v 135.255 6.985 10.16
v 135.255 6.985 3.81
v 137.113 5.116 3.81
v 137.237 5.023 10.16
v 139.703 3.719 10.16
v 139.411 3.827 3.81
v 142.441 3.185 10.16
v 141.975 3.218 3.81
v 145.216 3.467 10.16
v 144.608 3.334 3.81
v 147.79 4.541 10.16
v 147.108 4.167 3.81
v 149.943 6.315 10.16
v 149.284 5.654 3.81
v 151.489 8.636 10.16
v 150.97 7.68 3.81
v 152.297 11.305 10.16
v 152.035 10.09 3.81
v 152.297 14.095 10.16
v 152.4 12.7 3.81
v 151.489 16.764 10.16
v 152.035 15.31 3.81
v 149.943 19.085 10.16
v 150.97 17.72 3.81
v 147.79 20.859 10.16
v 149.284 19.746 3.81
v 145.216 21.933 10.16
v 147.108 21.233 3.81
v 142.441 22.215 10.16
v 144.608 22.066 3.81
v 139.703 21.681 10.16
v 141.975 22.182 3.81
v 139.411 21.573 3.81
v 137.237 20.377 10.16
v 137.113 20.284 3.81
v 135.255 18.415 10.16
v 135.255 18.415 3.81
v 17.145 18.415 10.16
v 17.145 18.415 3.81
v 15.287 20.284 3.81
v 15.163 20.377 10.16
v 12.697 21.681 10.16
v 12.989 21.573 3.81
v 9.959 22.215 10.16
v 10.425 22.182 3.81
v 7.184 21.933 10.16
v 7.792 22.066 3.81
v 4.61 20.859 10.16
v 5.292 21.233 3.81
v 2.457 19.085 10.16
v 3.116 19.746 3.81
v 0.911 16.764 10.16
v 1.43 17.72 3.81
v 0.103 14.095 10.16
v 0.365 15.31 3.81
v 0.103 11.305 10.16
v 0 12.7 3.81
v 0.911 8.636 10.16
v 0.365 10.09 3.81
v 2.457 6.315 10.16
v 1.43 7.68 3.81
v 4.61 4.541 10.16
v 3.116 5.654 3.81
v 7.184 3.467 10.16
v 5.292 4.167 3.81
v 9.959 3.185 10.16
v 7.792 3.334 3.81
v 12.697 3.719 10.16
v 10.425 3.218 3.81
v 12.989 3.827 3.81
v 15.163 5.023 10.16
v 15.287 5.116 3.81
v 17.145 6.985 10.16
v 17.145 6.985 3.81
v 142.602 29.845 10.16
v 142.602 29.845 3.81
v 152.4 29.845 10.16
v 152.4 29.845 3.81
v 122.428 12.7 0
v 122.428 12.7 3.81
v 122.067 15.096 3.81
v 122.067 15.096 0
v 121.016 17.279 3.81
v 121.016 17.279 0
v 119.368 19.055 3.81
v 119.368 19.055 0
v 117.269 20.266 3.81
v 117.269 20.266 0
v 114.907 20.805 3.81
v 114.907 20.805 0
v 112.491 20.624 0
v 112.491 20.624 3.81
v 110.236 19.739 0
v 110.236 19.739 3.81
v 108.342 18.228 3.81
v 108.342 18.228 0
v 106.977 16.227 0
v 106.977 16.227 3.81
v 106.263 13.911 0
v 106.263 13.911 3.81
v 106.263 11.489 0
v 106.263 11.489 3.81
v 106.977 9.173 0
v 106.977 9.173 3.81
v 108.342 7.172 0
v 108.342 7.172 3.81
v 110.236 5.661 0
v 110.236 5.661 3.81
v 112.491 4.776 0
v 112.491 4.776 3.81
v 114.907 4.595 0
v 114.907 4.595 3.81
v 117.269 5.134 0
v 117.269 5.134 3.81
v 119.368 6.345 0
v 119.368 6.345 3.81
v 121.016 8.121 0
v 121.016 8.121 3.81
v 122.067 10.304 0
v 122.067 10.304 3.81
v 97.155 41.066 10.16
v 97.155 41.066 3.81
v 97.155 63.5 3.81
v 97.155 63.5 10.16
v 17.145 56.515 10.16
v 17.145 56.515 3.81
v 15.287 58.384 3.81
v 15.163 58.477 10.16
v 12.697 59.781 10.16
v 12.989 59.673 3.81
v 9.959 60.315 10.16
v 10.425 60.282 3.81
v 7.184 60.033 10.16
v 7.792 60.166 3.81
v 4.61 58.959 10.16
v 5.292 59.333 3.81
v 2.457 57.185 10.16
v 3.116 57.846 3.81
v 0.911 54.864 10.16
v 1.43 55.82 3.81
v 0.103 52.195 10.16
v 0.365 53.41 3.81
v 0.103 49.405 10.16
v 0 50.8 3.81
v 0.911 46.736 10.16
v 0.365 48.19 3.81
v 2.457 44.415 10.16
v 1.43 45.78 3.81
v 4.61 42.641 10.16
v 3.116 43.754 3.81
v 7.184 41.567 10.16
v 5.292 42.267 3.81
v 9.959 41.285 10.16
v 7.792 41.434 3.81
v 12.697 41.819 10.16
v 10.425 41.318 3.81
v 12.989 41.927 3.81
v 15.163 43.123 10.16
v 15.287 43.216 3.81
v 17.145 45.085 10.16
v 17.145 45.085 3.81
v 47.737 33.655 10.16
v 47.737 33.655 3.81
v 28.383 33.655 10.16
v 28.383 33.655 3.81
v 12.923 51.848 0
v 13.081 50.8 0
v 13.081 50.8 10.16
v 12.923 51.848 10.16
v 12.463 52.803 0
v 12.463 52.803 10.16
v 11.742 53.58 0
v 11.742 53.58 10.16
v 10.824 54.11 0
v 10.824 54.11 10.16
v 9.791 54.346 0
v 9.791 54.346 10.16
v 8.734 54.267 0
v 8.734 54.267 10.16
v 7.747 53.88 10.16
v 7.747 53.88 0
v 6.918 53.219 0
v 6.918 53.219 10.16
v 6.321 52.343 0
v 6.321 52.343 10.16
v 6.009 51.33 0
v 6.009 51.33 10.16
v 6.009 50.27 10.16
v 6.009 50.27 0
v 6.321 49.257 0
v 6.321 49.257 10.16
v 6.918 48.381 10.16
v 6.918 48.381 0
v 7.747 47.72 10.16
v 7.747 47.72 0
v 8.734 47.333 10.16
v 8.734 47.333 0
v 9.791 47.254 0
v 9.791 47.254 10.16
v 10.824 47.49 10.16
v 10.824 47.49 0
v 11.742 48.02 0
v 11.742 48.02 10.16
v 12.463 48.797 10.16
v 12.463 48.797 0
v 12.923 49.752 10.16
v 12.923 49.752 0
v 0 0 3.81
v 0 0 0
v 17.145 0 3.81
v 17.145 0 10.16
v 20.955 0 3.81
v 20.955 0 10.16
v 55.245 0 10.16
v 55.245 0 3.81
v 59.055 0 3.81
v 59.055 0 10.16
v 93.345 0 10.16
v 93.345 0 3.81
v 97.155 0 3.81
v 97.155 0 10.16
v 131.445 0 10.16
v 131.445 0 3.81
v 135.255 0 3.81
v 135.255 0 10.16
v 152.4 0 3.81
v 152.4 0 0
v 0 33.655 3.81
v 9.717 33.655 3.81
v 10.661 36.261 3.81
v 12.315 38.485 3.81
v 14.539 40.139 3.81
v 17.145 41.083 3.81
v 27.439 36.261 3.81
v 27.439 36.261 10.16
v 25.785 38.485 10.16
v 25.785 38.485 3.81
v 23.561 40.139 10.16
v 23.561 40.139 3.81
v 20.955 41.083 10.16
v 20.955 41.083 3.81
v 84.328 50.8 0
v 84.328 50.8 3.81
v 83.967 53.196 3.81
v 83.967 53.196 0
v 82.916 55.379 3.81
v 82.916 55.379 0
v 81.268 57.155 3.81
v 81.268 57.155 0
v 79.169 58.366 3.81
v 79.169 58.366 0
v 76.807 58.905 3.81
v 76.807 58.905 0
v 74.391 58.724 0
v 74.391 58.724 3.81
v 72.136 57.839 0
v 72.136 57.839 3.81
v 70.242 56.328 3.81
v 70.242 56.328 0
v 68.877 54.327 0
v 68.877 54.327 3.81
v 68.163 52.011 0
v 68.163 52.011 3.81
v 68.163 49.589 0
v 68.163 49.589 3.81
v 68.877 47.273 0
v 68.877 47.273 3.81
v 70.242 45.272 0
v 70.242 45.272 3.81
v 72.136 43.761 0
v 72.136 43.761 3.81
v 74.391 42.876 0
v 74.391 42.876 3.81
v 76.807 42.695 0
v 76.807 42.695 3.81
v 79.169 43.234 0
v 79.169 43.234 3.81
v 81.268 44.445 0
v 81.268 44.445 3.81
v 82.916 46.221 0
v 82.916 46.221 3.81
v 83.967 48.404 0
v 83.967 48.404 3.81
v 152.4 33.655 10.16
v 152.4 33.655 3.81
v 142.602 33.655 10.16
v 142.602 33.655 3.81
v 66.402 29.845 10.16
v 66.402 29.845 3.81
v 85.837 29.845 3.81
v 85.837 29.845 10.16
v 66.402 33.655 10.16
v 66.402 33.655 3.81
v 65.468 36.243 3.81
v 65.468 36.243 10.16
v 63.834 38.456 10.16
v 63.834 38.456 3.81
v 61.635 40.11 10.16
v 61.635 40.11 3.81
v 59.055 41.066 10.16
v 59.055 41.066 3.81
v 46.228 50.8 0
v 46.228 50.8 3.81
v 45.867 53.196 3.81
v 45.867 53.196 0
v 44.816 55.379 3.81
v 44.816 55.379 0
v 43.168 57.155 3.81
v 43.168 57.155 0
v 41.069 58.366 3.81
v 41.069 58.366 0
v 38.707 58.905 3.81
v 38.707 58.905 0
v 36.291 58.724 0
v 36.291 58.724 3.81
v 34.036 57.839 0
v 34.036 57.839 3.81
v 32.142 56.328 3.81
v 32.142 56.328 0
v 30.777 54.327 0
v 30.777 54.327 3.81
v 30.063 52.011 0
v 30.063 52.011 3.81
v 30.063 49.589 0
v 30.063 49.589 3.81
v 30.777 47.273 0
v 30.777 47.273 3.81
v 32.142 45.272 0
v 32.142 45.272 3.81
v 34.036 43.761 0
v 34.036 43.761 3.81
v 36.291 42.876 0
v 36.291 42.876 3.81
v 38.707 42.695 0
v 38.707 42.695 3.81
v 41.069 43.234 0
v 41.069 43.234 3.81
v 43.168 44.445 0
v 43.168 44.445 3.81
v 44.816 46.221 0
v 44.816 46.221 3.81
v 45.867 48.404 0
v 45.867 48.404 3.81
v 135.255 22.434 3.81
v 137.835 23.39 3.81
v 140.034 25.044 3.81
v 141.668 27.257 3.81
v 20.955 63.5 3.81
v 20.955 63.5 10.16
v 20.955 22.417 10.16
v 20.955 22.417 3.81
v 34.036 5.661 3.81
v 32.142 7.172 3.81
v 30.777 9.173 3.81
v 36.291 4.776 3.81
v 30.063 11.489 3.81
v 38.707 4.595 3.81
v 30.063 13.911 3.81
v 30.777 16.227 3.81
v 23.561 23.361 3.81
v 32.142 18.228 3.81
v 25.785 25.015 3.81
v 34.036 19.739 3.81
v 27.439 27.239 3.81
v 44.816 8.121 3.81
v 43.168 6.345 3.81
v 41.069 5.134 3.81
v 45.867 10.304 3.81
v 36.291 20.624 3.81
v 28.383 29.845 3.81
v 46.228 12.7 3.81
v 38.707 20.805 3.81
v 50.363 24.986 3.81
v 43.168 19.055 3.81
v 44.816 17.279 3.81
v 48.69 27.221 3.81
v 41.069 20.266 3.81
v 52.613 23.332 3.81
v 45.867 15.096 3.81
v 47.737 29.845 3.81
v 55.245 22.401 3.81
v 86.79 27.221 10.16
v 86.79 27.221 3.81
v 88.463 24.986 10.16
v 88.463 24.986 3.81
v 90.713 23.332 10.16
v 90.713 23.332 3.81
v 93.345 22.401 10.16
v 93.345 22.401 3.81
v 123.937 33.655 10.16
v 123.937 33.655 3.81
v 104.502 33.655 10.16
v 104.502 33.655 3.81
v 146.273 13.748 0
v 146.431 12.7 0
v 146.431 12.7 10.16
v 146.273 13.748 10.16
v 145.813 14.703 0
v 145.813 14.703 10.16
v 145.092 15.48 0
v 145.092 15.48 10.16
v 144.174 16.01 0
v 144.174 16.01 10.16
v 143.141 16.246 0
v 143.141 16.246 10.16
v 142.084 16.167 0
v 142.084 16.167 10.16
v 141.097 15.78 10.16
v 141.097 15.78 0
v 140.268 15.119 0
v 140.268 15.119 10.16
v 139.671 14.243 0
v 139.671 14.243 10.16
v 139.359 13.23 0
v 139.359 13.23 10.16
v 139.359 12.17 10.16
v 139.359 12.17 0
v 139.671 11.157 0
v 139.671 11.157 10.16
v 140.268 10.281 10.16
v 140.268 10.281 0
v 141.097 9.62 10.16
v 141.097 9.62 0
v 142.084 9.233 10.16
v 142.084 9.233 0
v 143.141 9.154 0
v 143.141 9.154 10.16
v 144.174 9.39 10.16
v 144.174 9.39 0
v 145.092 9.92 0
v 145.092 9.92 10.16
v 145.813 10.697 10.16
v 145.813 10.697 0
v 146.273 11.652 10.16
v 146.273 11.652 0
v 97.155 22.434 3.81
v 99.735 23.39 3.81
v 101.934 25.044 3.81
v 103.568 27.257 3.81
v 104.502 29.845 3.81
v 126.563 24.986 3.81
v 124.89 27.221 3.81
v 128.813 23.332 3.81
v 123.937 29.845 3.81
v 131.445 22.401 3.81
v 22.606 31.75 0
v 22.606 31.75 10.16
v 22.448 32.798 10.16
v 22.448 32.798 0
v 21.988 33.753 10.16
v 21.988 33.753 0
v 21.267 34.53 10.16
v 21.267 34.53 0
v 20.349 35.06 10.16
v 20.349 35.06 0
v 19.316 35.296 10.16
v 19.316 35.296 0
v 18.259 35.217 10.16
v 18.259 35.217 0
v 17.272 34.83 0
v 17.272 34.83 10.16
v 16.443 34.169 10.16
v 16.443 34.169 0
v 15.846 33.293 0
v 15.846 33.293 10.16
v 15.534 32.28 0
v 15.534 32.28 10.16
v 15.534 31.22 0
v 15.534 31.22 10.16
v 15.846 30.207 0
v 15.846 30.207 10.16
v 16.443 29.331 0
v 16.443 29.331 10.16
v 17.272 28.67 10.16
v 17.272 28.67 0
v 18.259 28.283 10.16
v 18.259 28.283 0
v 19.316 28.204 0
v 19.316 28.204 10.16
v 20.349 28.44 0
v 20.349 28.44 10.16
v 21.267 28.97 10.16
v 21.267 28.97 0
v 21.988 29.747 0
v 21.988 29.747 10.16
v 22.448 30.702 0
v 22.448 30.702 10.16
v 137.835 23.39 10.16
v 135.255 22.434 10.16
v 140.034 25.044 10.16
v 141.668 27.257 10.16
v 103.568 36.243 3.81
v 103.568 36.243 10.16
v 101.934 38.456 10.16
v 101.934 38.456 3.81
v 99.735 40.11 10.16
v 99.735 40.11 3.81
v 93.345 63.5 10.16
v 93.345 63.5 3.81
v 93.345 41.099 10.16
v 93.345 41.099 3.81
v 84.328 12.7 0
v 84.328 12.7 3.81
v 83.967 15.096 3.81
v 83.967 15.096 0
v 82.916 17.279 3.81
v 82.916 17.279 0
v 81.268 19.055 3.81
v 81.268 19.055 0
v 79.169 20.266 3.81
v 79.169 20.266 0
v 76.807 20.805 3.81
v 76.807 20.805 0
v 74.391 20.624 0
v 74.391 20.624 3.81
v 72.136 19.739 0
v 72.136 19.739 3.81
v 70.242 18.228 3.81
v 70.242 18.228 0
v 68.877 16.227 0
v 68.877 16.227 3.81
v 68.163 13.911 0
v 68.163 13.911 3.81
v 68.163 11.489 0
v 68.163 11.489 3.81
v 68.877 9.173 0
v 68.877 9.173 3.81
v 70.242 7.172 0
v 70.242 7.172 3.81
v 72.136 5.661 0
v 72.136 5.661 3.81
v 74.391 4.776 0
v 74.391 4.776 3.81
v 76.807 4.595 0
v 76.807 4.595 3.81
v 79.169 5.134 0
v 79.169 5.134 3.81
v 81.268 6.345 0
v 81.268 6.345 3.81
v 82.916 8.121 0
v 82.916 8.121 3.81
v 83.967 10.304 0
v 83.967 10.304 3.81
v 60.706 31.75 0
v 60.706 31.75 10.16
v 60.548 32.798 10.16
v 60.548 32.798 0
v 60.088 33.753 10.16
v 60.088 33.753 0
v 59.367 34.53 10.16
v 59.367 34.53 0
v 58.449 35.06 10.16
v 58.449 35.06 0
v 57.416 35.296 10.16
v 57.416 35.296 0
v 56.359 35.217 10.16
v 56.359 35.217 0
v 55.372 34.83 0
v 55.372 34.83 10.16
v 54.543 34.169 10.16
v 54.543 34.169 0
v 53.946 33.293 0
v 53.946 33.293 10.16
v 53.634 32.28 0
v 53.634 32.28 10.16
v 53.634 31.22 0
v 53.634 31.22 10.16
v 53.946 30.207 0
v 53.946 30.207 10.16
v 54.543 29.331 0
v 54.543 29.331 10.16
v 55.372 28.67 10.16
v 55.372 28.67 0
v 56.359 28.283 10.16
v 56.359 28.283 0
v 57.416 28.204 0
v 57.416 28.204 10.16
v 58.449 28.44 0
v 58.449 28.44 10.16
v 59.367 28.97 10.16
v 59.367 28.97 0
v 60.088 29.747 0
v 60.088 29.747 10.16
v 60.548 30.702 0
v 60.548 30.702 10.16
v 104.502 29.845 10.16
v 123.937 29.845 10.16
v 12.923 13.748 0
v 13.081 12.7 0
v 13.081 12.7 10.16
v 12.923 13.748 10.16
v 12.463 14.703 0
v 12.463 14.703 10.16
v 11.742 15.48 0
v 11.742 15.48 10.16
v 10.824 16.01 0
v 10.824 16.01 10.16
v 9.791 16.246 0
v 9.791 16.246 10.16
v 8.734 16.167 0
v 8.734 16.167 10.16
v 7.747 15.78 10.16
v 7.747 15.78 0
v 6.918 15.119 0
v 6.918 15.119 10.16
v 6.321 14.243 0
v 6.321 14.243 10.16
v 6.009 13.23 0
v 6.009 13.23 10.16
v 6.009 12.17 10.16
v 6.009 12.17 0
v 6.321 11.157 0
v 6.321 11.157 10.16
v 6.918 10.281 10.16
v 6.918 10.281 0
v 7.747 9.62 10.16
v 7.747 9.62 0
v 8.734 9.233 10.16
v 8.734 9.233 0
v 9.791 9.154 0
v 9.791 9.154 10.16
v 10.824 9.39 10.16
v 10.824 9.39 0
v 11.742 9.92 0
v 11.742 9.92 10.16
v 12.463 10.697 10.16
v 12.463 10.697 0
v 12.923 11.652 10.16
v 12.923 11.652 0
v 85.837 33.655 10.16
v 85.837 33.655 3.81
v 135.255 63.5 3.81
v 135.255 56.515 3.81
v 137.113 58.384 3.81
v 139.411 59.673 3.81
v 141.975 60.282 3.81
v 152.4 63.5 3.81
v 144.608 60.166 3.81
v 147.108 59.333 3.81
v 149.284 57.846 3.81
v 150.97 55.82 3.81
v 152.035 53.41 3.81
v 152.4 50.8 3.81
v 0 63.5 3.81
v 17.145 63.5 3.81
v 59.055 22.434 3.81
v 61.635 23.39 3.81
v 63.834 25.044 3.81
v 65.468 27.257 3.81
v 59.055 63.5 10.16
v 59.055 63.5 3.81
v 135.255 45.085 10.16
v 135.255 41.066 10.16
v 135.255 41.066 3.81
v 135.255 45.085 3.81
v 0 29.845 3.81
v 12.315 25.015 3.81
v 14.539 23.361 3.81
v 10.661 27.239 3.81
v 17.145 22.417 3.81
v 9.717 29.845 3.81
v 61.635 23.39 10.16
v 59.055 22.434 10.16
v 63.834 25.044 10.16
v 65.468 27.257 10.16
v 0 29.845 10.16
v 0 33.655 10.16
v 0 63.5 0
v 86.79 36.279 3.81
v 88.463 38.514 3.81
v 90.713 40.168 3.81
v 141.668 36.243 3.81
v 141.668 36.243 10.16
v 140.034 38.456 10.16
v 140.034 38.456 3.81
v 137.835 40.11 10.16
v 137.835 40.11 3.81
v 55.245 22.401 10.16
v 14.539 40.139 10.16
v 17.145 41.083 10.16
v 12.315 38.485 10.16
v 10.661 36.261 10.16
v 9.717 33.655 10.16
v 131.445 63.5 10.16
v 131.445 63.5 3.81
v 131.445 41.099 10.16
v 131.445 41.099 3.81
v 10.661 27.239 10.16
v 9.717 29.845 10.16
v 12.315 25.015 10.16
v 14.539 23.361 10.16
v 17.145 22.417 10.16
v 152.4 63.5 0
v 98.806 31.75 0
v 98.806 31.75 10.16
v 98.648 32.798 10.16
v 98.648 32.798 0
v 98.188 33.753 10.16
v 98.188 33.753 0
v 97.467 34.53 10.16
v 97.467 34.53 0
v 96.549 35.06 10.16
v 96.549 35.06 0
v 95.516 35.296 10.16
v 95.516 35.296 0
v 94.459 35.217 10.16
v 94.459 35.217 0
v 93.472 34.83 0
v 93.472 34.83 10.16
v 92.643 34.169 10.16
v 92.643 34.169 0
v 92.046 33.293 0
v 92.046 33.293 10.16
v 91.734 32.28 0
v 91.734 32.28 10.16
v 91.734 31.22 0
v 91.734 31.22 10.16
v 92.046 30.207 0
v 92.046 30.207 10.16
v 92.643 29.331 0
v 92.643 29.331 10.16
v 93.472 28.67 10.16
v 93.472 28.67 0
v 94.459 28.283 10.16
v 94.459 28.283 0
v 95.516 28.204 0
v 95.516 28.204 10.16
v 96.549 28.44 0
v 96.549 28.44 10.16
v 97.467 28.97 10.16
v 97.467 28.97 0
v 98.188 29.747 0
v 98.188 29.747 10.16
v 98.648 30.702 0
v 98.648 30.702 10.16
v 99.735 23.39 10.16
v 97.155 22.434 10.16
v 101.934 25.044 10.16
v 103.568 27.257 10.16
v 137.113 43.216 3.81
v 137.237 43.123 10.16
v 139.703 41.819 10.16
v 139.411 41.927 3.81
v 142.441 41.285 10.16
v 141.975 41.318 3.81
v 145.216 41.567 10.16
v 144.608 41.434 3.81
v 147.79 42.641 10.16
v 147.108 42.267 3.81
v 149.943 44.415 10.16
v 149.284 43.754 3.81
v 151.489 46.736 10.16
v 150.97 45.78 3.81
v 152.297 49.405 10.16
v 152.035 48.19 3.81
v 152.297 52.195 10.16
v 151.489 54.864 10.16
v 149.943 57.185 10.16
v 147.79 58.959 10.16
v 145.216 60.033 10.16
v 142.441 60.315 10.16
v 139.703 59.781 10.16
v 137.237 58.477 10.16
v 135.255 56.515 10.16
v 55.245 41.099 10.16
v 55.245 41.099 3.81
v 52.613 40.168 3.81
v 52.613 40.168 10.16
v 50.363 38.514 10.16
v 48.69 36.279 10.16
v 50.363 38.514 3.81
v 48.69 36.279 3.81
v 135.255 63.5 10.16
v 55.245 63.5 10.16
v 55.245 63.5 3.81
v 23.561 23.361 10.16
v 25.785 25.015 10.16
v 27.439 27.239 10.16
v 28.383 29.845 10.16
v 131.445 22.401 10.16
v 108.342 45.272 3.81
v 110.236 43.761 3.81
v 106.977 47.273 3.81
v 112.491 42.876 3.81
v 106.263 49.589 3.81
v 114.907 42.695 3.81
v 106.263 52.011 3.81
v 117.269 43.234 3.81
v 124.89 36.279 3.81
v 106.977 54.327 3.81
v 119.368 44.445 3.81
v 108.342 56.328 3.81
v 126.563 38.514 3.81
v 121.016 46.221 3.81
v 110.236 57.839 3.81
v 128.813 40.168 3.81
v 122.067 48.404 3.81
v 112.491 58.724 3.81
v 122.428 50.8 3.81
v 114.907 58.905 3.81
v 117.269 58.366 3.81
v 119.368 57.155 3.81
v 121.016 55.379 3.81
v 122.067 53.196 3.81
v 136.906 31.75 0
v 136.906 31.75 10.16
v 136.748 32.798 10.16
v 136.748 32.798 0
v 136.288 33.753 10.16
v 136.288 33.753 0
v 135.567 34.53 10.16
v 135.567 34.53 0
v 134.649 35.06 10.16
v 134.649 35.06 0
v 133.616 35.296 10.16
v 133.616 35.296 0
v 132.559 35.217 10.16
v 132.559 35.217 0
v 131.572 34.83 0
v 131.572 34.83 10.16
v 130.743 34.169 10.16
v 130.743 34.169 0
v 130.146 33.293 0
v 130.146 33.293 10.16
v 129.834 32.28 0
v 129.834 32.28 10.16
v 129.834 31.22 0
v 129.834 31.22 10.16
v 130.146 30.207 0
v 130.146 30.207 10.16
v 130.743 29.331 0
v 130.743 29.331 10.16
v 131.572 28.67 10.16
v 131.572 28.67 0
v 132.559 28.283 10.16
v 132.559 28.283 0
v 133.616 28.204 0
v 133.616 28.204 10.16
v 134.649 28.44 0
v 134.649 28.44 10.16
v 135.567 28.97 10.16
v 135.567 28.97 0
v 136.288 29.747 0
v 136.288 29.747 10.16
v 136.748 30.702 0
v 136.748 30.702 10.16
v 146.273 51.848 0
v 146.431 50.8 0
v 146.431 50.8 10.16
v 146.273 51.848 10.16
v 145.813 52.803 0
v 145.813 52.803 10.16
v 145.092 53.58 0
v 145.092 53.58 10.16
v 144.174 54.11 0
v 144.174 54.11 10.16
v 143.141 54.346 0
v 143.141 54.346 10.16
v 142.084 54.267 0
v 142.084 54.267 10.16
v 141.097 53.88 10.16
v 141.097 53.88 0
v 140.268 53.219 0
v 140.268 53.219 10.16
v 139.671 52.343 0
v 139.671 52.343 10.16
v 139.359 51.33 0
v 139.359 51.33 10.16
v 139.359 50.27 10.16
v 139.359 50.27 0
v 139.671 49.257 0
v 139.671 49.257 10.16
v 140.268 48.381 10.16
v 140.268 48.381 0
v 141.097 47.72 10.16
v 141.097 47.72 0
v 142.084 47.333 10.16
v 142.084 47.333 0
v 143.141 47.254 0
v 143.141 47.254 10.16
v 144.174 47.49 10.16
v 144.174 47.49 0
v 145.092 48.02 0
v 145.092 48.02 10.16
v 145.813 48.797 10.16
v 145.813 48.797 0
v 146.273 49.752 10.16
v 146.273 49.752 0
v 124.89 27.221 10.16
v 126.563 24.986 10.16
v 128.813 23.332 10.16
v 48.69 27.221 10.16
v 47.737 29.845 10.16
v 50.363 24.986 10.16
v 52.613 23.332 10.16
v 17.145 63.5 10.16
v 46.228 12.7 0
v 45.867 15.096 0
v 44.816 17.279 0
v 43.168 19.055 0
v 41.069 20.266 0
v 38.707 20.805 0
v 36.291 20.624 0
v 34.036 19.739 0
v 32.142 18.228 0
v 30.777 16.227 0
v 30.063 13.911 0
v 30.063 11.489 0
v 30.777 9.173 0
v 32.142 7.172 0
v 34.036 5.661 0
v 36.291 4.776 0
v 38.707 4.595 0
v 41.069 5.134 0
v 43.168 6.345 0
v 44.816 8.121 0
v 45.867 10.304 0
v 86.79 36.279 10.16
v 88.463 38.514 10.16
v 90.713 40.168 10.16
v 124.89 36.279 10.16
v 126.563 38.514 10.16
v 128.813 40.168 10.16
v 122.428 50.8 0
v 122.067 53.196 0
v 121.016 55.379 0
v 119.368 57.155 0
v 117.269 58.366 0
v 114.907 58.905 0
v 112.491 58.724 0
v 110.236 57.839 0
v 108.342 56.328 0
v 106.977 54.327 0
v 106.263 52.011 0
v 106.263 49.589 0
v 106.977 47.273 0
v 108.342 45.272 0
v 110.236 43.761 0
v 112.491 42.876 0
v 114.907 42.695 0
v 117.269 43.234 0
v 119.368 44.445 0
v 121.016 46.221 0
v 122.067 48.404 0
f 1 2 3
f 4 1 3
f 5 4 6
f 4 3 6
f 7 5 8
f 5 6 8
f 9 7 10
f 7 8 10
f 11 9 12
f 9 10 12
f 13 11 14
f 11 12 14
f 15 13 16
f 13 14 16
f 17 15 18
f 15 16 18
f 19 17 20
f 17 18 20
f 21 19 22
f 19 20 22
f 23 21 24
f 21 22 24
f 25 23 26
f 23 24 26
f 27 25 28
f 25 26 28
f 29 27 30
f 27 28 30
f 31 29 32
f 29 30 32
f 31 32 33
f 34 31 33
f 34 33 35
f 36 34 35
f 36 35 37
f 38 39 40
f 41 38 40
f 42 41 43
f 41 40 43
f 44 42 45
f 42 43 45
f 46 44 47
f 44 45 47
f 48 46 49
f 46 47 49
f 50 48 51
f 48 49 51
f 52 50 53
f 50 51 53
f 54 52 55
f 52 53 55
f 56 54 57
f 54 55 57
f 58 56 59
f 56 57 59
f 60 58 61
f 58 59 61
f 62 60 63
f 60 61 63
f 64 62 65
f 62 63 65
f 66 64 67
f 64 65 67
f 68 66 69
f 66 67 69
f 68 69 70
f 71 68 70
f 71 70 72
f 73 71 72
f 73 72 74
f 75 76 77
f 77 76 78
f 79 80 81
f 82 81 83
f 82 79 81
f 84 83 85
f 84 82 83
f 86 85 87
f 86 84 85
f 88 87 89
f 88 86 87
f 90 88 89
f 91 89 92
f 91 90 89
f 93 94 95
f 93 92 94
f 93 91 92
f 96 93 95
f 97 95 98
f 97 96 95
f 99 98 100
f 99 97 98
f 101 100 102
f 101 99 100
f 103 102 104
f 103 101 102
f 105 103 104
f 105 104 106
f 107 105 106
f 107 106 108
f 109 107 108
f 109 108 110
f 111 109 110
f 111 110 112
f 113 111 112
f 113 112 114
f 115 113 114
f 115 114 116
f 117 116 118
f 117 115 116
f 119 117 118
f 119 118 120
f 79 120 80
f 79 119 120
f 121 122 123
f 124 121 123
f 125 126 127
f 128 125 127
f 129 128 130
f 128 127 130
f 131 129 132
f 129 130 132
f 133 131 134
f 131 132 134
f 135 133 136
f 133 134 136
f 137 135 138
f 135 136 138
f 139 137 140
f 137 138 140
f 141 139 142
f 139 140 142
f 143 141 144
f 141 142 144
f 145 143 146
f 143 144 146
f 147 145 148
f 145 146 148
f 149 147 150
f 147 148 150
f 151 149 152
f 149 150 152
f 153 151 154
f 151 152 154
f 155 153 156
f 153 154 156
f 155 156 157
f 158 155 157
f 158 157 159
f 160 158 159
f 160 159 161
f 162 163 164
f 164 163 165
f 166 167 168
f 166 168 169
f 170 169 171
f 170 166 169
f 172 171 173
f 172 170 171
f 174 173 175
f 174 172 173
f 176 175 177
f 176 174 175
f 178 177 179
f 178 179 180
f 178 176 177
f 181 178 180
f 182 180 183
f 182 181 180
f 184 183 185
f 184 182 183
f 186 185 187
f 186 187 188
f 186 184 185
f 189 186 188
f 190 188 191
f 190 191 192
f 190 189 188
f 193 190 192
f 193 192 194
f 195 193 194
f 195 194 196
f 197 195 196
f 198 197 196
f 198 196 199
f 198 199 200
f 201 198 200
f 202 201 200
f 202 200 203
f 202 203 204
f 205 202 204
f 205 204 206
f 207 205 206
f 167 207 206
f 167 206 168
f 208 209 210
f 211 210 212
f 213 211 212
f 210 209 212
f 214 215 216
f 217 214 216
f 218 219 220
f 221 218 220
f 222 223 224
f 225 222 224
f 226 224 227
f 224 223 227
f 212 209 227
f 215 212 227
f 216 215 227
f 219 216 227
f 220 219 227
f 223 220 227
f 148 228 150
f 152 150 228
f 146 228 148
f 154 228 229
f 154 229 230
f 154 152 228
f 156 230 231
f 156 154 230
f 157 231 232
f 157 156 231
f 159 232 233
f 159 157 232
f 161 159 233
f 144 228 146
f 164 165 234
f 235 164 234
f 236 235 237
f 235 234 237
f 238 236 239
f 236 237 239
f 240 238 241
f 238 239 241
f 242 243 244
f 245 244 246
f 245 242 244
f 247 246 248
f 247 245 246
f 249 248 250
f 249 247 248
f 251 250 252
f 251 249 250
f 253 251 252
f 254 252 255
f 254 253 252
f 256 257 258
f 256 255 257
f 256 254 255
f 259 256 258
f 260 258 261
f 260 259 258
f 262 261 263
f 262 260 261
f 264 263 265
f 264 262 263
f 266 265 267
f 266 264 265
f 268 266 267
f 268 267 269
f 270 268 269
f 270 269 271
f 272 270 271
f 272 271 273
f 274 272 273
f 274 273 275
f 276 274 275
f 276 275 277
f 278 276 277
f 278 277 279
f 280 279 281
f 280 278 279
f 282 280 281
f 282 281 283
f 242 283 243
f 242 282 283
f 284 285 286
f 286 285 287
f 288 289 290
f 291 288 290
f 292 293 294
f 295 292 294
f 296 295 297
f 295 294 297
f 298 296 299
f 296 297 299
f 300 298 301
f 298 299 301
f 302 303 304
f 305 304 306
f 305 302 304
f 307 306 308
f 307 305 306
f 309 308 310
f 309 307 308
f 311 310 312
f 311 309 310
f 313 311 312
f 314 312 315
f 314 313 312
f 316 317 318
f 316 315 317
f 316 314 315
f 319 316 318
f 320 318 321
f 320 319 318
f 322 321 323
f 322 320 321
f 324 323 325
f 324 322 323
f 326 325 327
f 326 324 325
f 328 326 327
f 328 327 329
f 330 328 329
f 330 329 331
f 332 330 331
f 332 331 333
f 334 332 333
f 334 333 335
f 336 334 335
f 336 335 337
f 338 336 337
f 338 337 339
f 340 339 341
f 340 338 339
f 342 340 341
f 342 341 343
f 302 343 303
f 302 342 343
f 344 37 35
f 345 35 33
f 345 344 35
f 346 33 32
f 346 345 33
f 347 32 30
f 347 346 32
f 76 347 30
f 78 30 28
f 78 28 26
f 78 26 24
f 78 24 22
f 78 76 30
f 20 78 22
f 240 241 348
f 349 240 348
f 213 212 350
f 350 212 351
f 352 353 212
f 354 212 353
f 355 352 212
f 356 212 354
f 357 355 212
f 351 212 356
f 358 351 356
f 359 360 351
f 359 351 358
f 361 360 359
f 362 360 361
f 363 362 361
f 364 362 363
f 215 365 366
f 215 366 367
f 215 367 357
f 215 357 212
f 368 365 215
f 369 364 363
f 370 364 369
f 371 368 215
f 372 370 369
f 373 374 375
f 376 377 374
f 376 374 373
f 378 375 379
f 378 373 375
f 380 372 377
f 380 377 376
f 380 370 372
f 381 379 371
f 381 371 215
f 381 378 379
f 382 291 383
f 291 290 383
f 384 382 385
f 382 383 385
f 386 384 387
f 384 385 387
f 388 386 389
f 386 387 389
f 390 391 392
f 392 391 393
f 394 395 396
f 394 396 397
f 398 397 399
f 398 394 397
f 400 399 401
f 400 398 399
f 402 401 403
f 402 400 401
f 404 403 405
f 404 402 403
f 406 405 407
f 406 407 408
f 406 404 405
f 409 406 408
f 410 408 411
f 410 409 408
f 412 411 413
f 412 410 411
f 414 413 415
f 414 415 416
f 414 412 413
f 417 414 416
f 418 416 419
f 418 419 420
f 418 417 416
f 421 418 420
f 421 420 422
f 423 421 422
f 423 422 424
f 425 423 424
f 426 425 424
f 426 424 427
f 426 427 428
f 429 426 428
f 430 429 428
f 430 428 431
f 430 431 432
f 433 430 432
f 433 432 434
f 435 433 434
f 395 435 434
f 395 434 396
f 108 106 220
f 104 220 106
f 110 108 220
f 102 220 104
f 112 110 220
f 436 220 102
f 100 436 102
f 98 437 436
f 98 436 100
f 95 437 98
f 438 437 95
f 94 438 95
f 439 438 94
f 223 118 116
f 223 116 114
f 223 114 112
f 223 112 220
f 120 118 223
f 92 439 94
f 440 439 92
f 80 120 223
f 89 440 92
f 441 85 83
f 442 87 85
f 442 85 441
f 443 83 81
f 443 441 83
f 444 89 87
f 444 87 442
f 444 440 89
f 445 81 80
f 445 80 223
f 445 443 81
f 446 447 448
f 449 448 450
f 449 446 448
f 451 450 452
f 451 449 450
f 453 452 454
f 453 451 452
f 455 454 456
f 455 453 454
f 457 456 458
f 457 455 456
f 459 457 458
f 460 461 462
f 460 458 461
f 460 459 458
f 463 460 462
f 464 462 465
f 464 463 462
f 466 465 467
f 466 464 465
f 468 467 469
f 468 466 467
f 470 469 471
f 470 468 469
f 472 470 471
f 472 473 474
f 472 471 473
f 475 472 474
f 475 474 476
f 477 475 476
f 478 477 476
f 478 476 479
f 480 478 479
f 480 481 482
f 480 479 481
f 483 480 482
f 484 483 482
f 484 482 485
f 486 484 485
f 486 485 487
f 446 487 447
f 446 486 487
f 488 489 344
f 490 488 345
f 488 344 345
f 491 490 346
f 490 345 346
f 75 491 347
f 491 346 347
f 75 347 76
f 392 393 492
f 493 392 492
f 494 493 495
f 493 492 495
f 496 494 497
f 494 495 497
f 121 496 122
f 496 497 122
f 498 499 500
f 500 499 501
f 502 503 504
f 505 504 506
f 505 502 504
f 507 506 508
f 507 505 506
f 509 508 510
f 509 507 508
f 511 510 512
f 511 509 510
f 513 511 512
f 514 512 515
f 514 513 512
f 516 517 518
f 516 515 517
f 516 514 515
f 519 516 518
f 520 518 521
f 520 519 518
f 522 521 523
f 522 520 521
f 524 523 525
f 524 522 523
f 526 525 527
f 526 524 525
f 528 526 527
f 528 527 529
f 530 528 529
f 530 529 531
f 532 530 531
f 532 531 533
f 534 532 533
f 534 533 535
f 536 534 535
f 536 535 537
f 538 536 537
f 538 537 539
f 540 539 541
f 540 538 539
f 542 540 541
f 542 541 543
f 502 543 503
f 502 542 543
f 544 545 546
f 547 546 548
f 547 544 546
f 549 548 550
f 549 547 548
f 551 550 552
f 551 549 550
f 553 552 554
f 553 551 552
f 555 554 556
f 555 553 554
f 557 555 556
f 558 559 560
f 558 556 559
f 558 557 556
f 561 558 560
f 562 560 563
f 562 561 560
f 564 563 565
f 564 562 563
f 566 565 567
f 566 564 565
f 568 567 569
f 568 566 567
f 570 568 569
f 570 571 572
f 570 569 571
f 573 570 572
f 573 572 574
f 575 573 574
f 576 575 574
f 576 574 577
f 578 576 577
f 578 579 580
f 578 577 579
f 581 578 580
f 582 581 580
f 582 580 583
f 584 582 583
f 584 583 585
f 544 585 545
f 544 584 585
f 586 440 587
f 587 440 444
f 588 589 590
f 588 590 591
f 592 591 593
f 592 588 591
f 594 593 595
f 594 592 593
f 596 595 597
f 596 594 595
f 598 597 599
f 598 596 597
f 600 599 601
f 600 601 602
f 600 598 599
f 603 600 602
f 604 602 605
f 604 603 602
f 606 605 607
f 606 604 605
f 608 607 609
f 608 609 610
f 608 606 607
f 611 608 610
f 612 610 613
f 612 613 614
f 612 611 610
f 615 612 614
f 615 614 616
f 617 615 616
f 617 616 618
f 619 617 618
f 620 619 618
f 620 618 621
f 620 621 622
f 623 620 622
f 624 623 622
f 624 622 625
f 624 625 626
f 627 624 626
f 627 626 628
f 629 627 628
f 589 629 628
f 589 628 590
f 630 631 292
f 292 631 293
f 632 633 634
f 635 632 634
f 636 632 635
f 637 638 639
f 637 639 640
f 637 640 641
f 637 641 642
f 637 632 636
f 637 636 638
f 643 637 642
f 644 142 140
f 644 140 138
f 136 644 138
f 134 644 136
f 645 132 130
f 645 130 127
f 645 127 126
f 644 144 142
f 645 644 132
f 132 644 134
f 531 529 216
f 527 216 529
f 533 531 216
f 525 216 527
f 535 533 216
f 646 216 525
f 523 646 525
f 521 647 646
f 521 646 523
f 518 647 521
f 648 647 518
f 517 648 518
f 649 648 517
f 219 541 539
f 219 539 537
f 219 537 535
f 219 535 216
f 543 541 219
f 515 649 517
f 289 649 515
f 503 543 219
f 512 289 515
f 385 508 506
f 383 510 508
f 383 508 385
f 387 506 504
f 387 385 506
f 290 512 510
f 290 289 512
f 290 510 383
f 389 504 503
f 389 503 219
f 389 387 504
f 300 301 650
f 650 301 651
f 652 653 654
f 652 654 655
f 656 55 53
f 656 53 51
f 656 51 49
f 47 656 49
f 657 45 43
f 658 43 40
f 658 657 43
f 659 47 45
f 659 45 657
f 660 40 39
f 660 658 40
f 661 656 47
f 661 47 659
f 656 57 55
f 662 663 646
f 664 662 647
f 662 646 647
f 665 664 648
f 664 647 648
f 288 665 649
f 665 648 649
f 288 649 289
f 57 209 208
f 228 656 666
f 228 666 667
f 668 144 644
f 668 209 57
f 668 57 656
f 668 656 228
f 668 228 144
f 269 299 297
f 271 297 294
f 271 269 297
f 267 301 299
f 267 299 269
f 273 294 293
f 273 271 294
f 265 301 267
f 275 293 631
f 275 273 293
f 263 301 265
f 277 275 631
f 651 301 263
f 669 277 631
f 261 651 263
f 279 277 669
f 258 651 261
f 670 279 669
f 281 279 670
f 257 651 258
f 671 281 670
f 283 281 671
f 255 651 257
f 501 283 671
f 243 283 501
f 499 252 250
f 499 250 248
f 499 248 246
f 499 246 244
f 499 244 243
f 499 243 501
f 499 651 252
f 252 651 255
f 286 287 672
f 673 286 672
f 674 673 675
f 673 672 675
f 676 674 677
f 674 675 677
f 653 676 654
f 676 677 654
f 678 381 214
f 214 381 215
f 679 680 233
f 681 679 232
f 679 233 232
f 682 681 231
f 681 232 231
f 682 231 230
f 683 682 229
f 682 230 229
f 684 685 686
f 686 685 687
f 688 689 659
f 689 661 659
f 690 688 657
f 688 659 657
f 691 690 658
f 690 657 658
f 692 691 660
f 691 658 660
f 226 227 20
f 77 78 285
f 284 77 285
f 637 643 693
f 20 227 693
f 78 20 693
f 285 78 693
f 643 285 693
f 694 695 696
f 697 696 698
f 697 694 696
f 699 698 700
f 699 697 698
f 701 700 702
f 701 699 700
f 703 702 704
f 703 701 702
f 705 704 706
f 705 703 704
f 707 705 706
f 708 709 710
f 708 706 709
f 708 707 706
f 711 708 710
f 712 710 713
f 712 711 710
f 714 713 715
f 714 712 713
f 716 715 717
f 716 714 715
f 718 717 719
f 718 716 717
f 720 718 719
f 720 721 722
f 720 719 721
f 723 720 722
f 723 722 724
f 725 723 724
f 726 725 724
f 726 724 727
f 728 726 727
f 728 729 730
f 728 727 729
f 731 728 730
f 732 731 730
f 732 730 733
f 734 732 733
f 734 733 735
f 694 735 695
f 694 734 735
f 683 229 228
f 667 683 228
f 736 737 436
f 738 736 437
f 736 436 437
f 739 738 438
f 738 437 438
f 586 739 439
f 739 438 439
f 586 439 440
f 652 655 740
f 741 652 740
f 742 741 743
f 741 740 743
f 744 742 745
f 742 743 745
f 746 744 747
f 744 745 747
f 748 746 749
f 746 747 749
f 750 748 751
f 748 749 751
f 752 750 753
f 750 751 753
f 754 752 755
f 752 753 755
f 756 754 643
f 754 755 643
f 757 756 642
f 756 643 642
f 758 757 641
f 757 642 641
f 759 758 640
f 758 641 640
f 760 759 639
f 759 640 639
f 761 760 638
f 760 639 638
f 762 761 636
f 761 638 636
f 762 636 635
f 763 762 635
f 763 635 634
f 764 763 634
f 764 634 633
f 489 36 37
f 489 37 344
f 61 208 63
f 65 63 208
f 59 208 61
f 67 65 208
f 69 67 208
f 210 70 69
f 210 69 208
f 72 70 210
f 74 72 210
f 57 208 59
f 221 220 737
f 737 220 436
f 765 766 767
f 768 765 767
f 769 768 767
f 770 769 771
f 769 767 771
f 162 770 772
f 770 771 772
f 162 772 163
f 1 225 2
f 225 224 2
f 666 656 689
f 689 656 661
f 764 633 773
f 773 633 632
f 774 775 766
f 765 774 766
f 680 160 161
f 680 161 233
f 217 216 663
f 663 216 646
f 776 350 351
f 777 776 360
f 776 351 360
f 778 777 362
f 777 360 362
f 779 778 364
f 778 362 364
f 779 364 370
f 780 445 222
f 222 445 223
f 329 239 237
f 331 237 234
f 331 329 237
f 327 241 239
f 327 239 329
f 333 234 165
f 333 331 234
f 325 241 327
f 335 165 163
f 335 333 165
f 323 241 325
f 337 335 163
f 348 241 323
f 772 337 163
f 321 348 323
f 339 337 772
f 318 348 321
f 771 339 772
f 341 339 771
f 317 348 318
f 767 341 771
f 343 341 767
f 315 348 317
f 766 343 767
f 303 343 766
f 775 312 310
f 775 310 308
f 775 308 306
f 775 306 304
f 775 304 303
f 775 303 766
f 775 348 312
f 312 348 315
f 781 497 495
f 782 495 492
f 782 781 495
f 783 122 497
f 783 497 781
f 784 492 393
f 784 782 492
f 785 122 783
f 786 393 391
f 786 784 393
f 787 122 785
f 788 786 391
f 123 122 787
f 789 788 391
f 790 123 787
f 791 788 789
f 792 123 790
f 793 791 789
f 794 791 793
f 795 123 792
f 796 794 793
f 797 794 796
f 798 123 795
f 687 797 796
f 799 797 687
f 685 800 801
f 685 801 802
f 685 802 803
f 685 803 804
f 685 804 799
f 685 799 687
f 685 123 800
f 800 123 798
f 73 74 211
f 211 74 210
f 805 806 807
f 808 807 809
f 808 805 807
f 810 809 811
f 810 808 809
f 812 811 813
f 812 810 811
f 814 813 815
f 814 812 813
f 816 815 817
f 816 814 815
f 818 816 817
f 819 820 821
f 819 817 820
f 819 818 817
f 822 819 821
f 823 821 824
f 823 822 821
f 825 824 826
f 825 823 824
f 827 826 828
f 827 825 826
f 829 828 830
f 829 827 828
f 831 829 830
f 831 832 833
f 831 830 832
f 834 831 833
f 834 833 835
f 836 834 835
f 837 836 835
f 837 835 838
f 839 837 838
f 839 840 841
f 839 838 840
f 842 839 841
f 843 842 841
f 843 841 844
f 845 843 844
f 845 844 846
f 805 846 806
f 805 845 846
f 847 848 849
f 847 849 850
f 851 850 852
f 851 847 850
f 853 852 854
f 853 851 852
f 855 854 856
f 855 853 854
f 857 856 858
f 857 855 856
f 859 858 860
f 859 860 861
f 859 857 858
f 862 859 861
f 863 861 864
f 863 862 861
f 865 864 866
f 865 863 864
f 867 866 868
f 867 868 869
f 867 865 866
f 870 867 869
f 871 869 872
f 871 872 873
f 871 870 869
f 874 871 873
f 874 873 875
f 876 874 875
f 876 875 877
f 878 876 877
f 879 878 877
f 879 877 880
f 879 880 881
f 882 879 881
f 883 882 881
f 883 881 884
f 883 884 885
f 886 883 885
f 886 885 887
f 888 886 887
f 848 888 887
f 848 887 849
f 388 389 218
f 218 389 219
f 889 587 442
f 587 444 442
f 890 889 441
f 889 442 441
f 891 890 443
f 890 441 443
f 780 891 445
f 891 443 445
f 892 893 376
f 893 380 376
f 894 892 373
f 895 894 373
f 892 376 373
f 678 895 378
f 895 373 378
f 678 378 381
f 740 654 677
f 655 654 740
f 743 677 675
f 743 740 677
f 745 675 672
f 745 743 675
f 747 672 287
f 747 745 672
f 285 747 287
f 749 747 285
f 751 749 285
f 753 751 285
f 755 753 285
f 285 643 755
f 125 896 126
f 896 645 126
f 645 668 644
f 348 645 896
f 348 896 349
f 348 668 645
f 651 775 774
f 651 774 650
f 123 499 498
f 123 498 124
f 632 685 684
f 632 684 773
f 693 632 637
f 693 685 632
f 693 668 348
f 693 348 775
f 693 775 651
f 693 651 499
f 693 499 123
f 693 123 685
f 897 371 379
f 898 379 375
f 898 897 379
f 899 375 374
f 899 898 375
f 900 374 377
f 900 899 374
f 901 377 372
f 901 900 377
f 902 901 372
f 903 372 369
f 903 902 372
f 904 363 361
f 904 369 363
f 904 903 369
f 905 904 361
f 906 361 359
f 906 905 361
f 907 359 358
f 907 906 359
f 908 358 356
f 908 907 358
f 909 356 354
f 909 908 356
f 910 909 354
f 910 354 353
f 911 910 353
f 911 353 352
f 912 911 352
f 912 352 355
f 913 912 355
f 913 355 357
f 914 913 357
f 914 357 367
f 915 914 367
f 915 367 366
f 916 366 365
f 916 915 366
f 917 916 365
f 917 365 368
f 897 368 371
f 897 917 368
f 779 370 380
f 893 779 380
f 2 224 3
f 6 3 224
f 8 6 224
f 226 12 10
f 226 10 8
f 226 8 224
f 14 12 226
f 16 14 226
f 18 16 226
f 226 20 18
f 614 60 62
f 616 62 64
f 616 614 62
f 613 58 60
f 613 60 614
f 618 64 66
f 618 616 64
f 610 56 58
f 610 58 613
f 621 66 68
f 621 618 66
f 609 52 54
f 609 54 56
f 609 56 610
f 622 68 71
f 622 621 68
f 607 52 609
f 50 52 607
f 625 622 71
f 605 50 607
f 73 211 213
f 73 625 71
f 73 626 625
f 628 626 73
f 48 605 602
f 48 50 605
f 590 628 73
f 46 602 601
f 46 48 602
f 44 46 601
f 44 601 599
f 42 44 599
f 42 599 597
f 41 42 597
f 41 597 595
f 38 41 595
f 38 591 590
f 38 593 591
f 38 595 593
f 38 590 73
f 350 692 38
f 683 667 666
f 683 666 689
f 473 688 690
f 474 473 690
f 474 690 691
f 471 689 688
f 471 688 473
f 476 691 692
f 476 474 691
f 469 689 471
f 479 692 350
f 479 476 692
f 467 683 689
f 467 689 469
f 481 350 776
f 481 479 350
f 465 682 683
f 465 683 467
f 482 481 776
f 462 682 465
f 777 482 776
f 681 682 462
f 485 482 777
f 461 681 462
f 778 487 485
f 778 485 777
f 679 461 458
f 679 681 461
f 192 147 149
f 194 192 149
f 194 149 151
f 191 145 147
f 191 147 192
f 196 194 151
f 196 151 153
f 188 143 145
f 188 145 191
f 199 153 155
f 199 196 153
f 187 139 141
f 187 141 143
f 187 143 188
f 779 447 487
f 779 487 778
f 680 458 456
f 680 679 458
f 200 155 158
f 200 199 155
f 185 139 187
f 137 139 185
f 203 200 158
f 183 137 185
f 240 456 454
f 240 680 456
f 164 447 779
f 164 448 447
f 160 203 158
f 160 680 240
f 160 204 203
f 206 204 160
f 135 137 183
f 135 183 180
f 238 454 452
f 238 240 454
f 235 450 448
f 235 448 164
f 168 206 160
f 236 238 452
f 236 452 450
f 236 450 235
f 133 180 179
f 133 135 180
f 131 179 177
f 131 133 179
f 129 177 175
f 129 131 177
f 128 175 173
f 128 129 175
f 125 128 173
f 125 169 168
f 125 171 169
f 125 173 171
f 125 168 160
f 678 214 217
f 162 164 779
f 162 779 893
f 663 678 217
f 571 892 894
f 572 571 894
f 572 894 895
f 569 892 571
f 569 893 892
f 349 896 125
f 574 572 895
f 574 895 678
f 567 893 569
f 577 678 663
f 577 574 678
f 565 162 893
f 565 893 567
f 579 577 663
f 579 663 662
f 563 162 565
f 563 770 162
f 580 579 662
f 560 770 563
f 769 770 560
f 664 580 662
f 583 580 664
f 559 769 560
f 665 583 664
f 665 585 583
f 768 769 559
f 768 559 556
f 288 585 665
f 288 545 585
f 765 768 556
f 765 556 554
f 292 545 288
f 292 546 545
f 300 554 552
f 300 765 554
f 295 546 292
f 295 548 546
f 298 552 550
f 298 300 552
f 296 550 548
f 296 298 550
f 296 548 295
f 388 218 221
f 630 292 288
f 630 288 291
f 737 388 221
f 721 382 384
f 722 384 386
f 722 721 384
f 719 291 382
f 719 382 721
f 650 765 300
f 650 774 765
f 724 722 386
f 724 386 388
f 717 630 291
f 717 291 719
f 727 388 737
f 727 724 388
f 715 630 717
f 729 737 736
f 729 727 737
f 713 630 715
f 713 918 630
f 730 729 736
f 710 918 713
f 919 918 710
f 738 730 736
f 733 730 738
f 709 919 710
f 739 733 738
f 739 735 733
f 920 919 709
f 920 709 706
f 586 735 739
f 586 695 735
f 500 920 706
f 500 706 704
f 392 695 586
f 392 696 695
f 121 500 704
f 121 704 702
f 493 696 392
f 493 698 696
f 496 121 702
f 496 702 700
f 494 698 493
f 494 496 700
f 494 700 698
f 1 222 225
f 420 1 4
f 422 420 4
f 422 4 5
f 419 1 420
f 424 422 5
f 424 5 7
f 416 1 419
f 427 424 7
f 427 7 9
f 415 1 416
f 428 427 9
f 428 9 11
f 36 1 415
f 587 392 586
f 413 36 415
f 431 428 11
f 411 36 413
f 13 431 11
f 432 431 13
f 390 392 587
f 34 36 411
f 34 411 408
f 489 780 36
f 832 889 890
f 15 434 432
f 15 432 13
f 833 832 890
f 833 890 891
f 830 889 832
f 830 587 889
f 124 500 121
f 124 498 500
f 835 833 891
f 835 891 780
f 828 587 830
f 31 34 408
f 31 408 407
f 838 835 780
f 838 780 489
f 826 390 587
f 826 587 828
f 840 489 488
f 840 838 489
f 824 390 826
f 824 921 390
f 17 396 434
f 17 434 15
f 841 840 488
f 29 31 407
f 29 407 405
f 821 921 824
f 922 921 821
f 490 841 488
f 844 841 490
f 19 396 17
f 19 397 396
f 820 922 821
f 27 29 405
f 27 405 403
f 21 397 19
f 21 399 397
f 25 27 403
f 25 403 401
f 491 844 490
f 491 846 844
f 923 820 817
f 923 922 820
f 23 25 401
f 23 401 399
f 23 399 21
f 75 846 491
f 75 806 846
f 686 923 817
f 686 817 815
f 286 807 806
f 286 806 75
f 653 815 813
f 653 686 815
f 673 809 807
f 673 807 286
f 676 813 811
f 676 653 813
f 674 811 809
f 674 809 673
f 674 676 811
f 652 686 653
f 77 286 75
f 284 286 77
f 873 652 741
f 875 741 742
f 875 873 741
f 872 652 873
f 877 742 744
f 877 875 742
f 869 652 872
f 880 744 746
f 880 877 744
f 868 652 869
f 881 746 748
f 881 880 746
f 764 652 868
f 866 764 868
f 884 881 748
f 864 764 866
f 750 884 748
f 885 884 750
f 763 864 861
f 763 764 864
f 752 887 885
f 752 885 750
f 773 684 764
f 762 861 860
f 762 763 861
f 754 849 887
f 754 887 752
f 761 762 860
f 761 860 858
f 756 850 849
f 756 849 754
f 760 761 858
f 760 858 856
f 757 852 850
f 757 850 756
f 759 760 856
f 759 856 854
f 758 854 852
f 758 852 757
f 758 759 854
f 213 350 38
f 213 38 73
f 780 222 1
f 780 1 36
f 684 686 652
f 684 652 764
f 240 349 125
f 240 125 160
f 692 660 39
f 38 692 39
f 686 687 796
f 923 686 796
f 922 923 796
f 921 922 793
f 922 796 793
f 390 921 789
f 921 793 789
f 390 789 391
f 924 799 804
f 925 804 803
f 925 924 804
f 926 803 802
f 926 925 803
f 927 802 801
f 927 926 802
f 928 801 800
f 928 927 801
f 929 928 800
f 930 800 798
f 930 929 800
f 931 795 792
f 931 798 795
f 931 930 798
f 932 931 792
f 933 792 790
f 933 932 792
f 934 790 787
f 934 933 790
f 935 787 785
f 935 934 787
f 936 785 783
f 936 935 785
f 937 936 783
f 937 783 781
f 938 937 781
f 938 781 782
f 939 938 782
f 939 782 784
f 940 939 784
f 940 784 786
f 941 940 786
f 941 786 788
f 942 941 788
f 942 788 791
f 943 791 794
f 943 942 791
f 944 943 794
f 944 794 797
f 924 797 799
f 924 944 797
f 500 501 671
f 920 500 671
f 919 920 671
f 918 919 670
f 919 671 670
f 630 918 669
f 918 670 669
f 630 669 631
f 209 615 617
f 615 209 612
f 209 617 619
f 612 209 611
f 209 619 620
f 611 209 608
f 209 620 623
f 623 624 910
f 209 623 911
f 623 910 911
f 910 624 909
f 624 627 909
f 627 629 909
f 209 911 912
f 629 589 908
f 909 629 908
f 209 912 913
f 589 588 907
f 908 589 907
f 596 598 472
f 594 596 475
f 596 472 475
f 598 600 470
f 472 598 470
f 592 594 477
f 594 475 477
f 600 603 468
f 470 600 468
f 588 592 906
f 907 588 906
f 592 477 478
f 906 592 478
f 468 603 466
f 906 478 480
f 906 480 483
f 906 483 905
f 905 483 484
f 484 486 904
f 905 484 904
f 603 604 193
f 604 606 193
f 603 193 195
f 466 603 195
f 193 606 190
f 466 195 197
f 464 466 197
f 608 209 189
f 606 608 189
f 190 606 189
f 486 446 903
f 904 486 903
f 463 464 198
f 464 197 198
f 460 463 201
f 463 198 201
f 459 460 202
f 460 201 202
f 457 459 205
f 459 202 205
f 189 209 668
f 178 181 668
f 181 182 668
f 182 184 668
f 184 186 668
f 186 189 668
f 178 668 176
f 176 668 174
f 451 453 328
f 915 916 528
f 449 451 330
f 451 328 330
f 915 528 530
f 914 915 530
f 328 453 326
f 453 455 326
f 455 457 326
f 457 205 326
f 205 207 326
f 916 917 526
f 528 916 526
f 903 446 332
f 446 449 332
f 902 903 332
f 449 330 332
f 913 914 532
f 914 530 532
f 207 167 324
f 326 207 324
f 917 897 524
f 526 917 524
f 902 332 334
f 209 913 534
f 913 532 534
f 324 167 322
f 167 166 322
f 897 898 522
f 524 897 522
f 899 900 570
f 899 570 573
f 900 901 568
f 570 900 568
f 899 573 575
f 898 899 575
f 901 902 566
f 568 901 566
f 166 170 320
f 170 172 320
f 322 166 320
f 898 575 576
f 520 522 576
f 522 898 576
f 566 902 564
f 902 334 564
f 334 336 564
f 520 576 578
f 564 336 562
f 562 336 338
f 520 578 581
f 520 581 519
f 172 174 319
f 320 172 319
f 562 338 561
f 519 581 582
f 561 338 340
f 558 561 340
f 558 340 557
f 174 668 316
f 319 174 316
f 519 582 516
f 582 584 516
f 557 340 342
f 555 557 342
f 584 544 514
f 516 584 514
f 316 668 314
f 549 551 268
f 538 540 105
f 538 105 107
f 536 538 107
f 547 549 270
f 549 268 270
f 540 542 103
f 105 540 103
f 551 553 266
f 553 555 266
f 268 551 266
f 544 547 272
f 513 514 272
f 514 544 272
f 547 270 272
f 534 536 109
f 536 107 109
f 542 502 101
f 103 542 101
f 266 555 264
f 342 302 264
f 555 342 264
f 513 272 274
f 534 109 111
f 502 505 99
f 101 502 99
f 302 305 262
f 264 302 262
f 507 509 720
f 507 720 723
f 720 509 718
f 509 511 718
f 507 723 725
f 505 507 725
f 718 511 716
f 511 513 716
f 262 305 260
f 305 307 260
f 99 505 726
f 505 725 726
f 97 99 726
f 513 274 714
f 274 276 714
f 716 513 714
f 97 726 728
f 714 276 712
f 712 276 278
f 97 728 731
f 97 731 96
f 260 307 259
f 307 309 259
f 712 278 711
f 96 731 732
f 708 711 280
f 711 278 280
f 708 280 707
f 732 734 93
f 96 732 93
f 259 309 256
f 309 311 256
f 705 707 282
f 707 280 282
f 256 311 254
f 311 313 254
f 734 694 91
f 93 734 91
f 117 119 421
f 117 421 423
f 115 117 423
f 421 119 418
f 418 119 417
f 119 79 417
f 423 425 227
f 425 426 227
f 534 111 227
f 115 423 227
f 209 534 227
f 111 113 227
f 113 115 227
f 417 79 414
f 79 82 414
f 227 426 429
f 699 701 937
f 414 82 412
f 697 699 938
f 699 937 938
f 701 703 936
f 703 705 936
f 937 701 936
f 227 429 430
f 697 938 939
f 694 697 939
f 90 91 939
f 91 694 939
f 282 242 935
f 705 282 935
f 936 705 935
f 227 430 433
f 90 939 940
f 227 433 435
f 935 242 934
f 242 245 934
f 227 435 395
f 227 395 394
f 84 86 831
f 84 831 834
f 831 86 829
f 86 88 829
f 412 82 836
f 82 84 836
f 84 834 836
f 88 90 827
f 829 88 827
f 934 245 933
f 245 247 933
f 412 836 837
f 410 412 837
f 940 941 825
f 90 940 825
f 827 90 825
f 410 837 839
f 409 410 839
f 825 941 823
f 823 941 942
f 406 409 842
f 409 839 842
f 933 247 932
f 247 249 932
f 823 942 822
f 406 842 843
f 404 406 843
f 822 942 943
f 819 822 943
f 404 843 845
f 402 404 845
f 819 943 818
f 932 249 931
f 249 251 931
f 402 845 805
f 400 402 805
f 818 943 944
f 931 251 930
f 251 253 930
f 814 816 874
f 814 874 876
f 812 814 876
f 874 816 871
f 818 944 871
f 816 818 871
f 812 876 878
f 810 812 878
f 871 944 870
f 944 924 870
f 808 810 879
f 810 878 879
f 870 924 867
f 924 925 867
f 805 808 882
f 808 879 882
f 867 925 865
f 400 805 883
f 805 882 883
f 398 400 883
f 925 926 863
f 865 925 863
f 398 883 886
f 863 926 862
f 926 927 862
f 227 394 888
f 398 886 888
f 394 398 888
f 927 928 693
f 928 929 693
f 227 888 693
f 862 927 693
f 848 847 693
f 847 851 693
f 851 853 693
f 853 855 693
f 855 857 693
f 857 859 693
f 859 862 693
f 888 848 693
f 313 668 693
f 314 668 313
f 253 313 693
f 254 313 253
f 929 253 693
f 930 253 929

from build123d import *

# Parameters (mm, degrees)
F0_W      = 152.4
F0_H      = 63.5
F1_DEPTH  = 3.81
F2_R      = 8.128
F3_DEPTH  = 3.811
F5_DEPTH  = 10.16
F6_R      = 3.556
F7_DEPTH  = 10.161
F8_R      = 9.525
F9_DEPTH  = 10.16
F10_R     = 9.525
F10_R_2   = 3.556
F11_DEPTH = 10.16
F12_R     = 3.556
F13_DEPTH = 10.161


with BuildPart() as f1:
    # F0 (on Top) → F1 (new body)
    with BuildSketch(Plane.XY):
        with Locations((76.2, 31.75)):
            Rectangle(F0_W, F0_H)
    extrude(amount=F1_DEPTH)

    # F2 (on Top) → F3 (cut, through all)
    with BuildSketch(Plane.XY):
        with Locations((38.1, 12.7)):
            Circle(F2_R)
        with Locations((38.1, 50.8)):
            Circle(F2_R)
        with Locations((76.2, 50.8)):
            Circle(F2_R)
        with Locations((76.2, 12.7)):
            Circle(F2_R)
        with Locations((114.3, 50.8)):
            Circle(F2_R)
        with Locations((114.3, 12.7)):
            Circle(F2_R)
    extrude(amount=F3_DEPTH, mode=Mode.SUBTRACT)

    # F4 (on Top) → F5 (join)
    with BuildSketch(Plane.XY):
        Polygon((59.055, 63.5), (55.245, 63.5), (55.245, 33.655), (20.955, 33.655), (20.955, 63.5), (17.145, 63.5), (17.145, 33.655), (0, 33.655), (0, 29.845), (17.145, 29.845), (17.145, 0), (20.955, 0), (20.955, 29.845), (55.245, 29.845), (55.245, 0), (59.055, 0), (59.055, 29.845), (93.345, 29.845), (93.345, 0), (97.155, 0), (97.155, 29.845), (131.445, 29.845), (131.445, 0), (135.255, 0), (135.255, 29.845), (152.4, 29.845), (152.4, 33.655), (135.255, 33.655), (135.255, 63.5), (131.445, 63.5), (131.445, 33.655), (97.155, 33.655), (97.155, 63.5), (93.345, 63.5), (93.345, 33.655), (59.055, 33.655), align=None)
    extrude(amount=F5_DEPTH)

    # F6 (on Top) → F7 (cut, through all)
    with BuildSketch(Plane.XY):
        with Locations((9.525, 50.8)):
            Circle(F6_R)
        with Locations((9.525, 12.7)):
            Circle(F6_R)
        with Locations((142.875, 12.7)):
            Circle(F6_R)
        with Locations((142.875, 50.8)):
            Circle(F6_R)
    extrude(amount=F7_DEPTH, mode=Mode.SUBTRACT)

    # F8 (on Top) → F9 (join)
    with BuildSketch(Plane.XY):
        with Locations((57.069456, 31.75)):
            Circle(F8_R)
        with Locations((95.169456, 31.75)):
            Circle(F8_R)
        with Locations((19.05, 31.75)):
            Circle(F8_R)
        with Locations((133.269456, 31.75)):
            Circle(F8_R)
    extrude(amount=F9_DEPTH)

    # F10 (on Top) → F11 (join)
    with BuildSketch(Plane.XY):
        with Locations((9.525, 50.8)):
            Circle(F10_R)
        with Locations((9.525, 50.8)):
            Circle(F10_R_2, mode=Mode.SUBTRACT)
        with Locations((9.525, 12.7)):
            Circle(F10_R)
        with Locations((9.525, 12.7)):
            Circle(F10_R_2, mode=Mode.SUBTRACT)
        with Locations((142.875, 50.8)):
            Circle(F10_R)
        with Locations((142.875, 50.8)):
            Circle(F10_R_2, mode=Mode.SUBTRACT)
        with Locations((142.875, 12.7)):
            Circle(F10_R)
        with Locations((142.875, 12.7)):
            Circle(F10_R_2, mode=Mode.SUBTRACT)
    extrude(amount=F11_DEPTH)

    # F12 (on Top) → F13 (cut, through all)
    with BuildSketch(Plane.XY):
        with Locations((19.05, 31.75)):
            Circle(F12_R)
        with Locations((57.15, 31.75)):
            Circle(F12_R)
        with Locations((95.25, 31.75)):
            Circle(F12_R)
        with Locations((133.35, 31.75)):
            Circle(F12_R)
    extrude(amount=F13_DEPTH, mode=Mode.SUBTRACT)


solid = f1.part
